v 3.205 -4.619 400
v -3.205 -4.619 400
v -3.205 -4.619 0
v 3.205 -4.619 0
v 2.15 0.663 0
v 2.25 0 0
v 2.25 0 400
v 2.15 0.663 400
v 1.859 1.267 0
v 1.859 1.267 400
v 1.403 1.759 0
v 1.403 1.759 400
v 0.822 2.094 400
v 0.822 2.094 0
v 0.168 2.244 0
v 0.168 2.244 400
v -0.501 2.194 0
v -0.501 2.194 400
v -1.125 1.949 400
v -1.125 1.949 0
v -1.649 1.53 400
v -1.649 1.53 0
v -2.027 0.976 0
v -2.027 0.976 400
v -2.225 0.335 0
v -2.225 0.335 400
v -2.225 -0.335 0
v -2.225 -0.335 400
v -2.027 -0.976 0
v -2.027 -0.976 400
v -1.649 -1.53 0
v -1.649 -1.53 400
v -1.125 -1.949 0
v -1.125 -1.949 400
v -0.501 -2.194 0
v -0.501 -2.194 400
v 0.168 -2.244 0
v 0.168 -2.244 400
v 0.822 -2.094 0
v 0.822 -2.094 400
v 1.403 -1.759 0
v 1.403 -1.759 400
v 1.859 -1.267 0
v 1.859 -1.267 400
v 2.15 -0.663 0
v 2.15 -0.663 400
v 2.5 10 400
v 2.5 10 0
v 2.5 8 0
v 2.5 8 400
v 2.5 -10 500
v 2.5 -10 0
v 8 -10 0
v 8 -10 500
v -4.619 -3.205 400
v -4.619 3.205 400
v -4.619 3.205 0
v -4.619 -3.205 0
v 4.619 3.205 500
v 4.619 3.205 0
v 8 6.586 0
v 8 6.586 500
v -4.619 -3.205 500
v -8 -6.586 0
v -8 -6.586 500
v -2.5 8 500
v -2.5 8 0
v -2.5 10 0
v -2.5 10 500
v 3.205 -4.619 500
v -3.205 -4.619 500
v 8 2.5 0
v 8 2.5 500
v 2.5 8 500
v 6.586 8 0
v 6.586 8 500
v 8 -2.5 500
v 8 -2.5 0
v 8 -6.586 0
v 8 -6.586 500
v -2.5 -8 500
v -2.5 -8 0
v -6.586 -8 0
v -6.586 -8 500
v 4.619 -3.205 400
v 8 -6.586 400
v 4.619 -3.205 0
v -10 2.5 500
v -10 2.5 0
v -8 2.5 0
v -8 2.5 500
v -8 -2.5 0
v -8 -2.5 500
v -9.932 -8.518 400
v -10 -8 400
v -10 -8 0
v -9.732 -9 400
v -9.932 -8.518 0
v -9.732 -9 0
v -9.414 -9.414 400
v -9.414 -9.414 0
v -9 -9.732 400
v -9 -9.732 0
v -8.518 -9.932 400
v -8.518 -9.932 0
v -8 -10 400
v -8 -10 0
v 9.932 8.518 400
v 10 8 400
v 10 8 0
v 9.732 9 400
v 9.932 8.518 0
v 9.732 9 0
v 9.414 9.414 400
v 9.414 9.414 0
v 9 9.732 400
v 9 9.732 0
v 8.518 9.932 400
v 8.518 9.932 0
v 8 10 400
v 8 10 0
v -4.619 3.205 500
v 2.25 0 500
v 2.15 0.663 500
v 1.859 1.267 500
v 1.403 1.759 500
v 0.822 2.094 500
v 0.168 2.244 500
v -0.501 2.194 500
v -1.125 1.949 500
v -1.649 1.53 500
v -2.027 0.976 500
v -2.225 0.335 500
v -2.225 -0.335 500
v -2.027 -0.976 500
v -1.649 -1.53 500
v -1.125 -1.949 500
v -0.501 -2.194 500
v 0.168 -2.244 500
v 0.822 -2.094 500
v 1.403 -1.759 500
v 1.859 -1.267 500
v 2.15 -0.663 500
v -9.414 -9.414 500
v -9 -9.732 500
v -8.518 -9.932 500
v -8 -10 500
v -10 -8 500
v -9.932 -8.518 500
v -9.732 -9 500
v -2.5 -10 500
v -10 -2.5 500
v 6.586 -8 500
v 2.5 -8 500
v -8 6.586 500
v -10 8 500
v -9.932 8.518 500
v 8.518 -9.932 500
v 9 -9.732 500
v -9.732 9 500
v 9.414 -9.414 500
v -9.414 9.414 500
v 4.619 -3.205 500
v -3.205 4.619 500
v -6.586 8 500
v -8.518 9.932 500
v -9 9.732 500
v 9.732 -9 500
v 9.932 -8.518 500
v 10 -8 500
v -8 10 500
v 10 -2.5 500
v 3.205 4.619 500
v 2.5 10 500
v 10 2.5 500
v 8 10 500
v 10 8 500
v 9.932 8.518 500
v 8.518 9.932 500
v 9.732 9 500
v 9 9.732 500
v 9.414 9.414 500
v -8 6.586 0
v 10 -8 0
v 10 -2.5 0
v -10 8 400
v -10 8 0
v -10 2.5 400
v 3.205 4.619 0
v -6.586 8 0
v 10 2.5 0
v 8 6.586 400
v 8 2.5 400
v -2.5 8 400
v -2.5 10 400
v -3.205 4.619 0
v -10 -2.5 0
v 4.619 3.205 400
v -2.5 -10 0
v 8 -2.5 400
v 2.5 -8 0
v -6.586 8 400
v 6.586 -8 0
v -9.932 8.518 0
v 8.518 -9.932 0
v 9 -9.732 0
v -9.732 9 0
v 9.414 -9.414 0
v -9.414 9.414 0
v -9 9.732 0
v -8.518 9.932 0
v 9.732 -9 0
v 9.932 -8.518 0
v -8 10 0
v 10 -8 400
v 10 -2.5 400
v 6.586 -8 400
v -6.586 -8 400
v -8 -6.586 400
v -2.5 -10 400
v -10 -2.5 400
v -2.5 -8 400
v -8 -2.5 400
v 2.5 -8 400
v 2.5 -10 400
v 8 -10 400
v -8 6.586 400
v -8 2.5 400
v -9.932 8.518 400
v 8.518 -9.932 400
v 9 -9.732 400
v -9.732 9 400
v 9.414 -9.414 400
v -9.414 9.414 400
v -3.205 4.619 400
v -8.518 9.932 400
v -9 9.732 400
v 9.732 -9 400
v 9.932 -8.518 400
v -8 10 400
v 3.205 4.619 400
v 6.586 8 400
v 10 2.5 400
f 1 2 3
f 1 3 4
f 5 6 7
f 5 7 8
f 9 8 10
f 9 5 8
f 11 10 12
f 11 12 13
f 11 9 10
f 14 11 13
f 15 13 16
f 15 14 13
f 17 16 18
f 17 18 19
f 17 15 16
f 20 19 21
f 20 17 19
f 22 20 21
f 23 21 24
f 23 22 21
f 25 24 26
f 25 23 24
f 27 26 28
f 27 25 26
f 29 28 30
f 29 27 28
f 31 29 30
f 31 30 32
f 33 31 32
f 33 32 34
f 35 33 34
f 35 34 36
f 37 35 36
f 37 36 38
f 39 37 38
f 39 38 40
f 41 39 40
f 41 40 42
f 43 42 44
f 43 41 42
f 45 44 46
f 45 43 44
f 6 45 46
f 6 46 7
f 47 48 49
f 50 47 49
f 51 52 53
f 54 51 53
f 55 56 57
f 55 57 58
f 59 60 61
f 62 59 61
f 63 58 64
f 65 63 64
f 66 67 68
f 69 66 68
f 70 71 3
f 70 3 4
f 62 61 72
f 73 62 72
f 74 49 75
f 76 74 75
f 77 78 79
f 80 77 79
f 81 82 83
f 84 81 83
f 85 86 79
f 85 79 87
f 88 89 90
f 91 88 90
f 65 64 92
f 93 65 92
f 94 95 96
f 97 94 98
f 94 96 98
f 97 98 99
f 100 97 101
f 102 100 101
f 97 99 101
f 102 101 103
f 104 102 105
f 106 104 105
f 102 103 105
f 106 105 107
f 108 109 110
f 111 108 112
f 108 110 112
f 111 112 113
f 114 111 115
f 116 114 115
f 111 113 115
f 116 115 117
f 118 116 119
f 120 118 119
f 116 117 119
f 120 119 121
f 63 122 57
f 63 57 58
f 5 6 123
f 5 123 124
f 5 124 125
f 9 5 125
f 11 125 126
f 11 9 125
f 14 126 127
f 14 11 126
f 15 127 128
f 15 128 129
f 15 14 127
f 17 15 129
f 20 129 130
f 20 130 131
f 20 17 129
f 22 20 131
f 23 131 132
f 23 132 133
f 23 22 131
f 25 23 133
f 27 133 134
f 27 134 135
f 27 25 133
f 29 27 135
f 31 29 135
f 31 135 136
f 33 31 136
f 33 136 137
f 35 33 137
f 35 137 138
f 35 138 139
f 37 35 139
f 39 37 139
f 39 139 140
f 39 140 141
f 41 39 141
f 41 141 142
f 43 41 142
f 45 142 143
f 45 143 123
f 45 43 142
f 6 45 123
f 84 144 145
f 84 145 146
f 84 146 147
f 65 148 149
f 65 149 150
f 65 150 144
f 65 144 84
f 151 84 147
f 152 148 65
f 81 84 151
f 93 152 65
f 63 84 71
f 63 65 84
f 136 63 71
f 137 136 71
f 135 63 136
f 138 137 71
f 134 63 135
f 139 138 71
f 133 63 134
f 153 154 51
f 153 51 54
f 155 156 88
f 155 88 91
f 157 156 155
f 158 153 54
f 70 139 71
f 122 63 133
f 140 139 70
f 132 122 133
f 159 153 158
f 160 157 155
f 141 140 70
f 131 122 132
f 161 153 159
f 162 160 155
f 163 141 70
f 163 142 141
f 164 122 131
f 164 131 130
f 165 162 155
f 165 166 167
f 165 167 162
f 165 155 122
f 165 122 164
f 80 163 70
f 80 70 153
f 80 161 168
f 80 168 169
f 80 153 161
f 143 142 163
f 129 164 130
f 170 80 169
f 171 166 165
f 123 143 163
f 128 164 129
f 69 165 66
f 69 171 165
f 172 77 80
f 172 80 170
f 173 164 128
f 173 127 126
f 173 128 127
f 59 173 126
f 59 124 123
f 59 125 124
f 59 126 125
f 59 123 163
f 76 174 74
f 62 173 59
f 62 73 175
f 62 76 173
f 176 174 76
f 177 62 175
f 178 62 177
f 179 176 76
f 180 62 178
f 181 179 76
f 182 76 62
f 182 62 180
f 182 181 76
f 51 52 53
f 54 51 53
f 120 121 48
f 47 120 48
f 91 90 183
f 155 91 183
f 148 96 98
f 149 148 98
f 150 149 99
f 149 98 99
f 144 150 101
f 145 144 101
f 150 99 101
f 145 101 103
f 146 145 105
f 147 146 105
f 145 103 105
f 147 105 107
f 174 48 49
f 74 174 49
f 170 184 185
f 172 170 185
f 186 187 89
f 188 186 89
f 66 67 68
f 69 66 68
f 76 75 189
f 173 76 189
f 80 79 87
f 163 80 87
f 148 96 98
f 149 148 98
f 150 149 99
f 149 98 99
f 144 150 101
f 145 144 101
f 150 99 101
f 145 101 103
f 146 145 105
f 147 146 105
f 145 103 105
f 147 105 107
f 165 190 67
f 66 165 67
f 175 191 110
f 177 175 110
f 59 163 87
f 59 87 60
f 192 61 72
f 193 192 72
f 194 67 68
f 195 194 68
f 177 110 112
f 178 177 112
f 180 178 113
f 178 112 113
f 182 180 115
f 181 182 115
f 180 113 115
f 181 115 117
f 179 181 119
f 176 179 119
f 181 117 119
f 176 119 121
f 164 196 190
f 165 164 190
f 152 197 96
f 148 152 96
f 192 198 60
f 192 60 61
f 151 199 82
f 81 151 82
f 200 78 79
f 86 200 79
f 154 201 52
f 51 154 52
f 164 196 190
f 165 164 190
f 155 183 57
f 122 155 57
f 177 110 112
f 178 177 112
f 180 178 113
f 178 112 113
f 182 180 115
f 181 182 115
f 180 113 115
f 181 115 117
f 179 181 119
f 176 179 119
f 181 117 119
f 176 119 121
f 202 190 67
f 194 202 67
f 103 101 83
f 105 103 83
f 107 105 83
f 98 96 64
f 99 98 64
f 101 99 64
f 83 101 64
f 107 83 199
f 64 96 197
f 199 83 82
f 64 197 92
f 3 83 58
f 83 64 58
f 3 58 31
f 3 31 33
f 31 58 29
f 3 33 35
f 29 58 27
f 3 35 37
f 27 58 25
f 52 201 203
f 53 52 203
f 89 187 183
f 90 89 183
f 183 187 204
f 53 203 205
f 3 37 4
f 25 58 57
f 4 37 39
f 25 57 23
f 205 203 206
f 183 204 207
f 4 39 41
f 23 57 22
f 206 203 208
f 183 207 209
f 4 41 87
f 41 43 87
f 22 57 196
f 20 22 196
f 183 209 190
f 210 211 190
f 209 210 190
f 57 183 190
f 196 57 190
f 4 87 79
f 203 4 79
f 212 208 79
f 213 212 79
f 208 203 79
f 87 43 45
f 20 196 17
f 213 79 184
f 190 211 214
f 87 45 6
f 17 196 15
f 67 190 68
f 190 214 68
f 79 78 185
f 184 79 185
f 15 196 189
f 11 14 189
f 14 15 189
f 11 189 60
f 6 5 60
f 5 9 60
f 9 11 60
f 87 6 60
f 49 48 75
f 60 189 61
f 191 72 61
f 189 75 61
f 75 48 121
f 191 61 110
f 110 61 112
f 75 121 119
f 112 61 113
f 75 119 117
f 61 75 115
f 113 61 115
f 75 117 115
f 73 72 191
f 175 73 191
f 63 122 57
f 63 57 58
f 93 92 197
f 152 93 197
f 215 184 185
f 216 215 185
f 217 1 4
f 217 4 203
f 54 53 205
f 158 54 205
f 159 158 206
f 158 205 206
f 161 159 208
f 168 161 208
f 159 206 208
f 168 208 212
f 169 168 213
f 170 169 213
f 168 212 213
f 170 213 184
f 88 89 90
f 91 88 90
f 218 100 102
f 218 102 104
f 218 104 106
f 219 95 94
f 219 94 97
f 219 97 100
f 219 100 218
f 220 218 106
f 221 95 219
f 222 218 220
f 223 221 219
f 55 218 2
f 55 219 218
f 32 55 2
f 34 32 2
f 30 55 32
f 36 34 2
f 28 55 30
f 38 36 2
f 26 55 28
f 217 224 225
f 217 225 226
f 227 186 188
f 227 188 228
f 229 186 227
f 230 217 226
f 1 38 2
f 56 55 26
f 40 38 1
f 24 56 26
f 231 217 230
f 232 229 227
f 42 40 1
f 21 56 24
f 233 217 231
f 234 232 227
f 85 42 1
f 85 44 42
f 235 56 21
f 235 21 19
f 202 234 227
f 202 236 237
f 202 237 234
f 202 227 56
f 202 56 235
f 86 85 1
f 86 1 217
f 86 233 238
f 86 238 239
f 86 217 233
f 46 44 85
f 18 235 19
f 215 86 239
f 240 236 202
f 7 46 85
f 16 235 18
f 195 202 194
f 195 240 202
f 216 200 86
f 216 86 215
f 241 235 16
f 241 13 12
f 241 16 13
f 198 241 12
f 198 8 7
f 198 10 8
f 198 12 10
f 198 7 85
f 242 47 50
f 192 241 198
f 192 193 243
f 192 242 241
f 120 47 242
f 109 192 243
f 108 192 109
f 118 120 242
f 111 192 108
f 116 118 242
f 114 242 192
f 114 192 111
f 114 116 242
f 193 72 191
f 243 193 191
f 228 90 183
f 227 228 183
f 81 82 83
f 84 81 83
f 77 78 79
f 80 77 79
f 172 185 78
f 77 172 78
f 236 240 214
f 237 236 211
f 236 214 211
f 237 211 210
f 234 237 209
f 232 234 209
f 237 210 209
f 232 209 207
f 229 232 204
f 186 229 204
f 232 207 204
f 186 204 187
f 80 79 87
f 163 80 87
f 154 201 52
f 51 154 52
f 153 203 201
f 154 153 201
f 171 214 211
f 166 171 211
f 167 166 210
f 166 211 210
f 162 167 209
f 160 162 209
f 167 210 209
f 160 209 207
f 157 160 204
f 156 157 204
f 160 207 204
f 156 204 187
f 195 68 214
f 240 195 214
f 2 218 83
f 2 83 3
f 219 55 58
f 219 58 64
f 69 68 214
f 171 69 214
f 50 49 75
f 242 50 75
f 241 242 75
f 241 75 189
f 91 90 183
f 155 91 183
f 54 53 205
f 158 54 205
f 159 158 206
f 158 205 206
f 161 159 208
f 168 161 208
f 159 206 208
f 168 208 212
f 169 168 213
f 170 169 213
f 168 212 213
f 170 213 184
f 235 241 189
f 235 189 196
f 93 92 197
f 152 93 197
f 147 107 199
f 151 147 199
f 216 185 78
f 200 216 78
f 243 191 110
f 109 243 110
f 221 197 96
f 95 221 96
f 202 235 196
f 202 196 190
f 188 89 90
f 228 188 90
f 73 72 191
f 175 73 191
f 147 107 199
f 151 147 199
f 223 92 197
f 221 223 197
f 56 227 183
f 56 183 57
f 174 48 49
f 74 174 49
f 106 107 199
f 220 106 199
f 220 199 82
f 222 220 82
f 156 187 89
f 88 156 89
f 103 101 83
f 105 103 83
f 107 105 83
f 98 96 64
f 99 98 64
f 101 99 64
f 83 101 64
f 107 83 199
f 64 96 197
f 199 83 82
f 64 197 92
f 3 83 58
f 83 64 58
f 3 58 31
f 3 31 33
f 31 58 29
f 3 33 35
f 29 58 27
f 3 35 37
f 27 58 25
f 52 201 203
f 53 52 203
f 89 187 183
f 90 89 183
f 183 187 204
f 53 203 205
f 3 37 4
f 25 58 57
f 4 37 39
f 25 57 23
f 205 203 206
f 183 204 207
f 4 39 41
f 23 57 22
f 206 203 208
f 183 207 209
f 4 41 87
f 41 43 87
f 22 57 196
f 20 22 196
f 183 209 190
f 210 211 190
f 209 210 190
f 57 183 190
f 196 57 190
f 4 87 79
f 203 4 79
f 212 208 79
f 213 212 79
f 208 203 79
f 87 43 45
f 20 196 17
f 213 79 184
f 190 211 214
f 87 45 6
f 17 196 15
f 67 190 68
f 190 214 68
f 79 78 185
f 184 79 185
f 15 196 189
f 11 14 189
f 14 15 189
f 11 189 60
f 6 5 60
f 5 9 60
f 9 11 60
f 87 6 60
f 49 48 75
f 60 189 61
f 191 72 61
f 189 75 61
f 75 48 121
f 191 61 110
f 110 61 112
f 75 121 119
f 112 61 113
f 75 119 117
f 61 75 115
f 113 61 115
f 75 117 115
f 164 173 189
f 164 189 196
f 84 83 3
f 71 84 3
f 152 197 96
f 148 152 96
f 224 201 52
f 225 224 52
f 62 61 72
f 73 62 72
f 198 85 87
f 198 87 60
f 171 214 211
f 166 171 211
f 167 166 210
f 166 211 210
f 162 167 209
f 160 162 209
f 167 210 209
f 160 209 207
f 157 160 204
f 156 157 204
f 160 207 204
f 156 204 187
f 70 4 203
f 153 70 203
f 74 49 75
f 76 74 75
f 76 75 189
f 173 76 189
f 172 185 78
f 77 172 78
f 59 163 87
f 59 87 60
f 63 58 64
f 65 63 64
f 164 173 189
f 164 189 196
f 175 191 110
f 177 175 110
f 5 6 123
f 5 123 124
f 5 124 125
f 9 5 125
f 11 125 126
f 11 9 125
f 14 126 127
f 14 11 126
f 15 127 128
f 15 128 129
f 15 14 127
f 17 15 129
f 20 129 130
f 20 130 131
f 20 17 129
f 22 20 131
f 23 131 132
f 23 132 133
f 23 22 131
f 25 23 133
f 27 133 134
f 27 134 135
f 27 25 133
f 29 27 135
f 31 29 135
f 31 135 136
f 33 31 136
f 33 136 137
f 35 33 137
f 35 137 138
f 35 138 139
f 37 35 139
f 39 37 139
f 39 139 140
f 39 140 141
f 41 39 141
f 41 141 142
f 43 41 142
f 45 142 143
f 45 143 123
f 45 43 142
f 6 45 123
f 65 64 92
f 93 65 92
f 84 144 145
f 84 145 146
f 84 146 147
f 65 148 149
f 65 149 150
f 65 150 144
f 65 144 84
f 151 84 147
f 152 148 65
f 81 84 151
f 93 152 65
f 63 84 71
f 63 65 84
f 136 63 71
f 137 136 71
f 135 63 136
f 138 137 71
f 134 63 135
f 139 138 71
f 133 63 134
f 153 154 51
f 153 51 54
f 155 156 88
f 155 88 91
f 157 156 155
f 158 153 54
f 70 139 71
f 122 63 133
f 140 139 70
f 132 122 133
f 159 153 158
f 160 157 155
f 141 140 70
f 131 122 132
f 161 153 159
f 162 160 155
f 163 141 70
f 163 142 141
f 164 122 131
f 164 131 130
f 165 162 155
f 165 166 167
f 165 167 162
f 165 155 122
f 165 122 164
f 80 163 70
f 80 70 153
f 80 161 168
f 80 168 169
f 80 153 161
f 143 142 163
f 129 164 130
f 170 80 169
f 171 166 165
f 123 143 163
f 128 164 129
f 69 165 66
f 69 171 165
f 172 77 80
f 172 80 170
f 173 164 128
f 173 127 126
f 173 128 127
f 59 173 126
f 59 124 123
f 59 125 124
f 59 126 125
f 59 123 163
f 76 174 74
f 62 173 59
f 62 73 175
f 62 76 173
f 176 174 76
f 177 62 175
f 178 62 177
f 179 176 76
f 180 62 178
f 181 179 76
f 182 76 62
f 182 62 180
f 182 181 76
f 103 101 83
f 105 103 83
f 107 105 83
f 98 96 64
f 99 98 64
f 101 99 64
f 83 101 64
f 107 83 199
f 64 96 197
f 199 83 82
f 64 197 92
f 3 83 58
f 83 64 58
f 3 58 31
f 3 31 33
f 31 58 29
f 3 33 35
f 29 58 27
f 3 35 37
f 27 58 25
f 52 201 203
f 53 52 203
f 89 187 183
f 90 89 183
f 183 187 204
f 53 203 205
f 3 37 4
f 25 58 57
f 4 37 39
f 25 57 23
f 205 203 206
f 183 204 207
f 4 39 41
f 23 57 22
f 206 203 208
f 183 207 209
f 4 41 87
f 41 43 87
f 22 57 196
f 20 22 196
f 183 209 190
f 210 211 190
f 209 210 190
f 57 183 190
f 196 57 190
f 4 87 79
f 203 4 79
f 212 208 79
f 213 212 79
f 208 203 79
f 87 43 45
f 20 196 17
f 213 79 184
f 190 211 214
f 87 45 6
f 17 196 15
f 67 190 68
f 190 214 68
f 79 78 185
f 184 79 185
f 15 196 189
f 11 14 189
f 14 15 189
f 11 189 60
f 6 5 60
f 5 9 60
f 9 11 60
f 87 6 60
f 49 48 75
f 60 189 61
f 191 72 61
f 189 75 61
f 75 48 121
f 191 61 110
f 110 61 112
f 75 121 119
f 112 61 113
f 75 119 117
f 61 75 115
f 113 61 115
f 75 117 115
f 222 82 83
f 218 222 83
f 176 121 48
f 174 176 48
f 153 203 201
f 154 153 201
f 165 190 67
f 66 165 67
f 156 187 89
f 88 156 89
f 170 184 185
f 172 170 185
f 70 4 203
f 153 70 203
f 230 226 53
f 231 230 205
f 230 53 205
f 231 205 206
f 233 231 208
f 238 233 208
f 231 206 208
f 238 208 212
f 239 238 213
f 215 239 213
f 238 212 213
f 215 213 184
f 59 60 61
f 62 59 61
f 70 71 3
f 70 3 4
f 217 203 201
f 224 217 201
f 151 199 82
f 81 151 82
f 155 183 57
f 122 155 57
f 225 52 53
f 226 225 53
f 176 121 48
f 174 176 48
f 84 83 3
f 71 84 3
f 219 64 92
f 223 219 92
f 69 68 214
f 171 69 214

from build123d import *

# Parameters (mm, degrees)
F0_R     = 2.25
F1_DEPTH = 500
F2_DEPTH = 500
F3_DEPTH = 400


with BuildPart() as f1:
    # F0 (on Top) → F1 (new body)
    with BuildSketch(Plane.XY):
        with BuildLine():
            ThreePointArc((-10, -8), (-9.414214, -9.414214), (-8, -10))
            Line((-8, -10), (-2.5, -10))
            Line((-2.5, -10), (-2.5, -8))
            Line((-2.5, -8), (-6.585786, -8))
            Line((-6.585786, -8), (-3.204844, -4.619057))
            Line((-3.204844, -4.619057), (0, -4.619057))
            Line((0, -4.619057), (3.204844, -4.619057))
            Line((3.204844, -4.619057), (6.585786, -8))
            Line((6.585786, -8), (2.5, -8))
            Line((2.5, -8), (2.5, -10))
            Line((2.5, -10), (8, -10))
            ThreePointArc((8, -10), (9.414214, -9.414214), (10, -8))
            Line((10, -8), (10, -2.5))
            Line((10, -2.5), (8, -2.5))
            Line((8, -2.5), (8, -6.585786))
            Line((8, -6.585786), (4.619057, -3.204844))
            Line((4.619057, -3.204844), (4.619057, 0))
            Line((4.619057, 0), (4.619057, 3.204844))
            Line((4.619057, 3.204844), (8, 6.585786))
            Line((8, 6.585786), (8, 2.5))
            Line((8, 2.5), (10, 2.5))
            Line((10, 2.5), (10, 8))
            ThreePointArc((10, 8), (9.414214, 9.414214), (8, 10))
            Line((8, 10), (2.5, 10))
            Line((2.5, 10), (2.5, 8))
            Line((2.5, 8), (6.585786, 8))
            Line((6.585786, 8), (3.204844, 4.619057))
            Line((3.204844, 4.619057), (0, 4.619057))
            Line((0, 4.619057), (-3.204844, 4.619057))
            Line((-3.204844, 4.619057), (-6.585786, 8))
            Line((-6.585786, 8), (-2.5, 8))
            Line((-2.5, 8), (-2.5, 10))
            Line((-2.5, 10), (-8, 10))
            ThreePointArc((-8, 10), (-9.414214, 9.414214), (-10, 8))
            Line((-10, 8), (-10, 2.5))
            Line((-10, 2.5), (-8, 2.5))
            Line((-8, 2.5), (-8, 6.585786))
            Line((-8, 6.585786), (-4.619057, 3.204844))
            Line((-4.619057, 3.204844), (-4.619057, 0))
            Line((-4.619057, 0), (-4.619057, -3.204844))
            Line((-4.619057, -3.204844), (-8, -6.585786))
            Line((-8, -6.585786), (-8, -2.5))
            Line((-8, -2.5), (-10, -2.5))
            Line((-10, -2.5), (-10, -8))
        make_face()
        Circle(F0_R, mode=Mode.SUBTRACT)
    extrude(amount=F1_DEPTH)


with BuildPart() as f2:
    # F0 (on Top) → F2 (new body)
    with BuildSketch(Plane.XY):
        with BuildLine():
            ThreePointArc((-10, -8), (-9.414214, -9.414214), (-8, -10))
            Line((-8, -10), (-2.5, -10))
            Line((-2.5, -10), (-2.5, -8))
            Line((-2.5, -8), (-6.585786, -8))
            Line((-6.585786, -8), (-3.204844, -4.619057))
            Line((-3.204844, -4.619057), (0, -4.619057))
            Line((0, -4.619057), (3.204844, -4.619057))
            Line((3.204844, -4.619057), (6.585786, -8))
            Line((6.585786, -8), (2.5, -8))
            Line((2.5, -8), (2.5, -10))
            Line((2.5, -10), (8, -10))
            ThreePointArc((8, -10), (9.414214, -9.414214), (10, -8))
            Line((10, -8), (10, -2.5))
            Line((10, -2.5), (8, -2.5))
            Line((8, -2.5), (8, -6.585786))
            Line((8, -6.585786), (4.619057, -3.204844))
            Line((4.619057, -3.204844), (4.619057, 0))
            Line((4.619057, 0), (4.619057, 3.204844))
            Line((4.619057, 3.204844), (8, 6.585786))
            Line((8, 6.585786), (8, 2.5))
            Line((8, 2.5), (10, 2.5))
            Line((10, 2.5), (10, 8))
            ThreePointArc((10, 8), (9.414214, 9.414214), (8, 10))
            Line((8, 10), (2.5, 10))
            Line((2.5, 10), (2.5, 8))
            Line((2.5, 8), (6.585786, 8))
            Line((6.585786, 8), (3.204844, 4.619057))
            Line((3.204844, 4.619057), (0, 4.619057))
            Line((0, 4.619057), (-3.204844, 4.619057))
            Line((-3.204844, 4.619057), (-6.585786, 8))
            Line((-6.585786, 8), (-2.5, 8))
            Line((-2.5, 8), (-2.5, 10))
            Line((-2.5, 10), (-8, 10))
            ThreePointArc((-8, 10), (-9.414214, 9.414214), (-10, 8))
            Line((-10, 8), (-10, 2.5))
            Line((-10, 2.5), (-8, 2.5))
            Line((-8, 2.5), (-8, 6.585786))
            Line((-8, 6.585786), (-4.619057, 3.204844))
            Line((-4.619057, 3.204844), (-4.619057, 0))
            Line((-4.619057, 0), (-4.619057, -3.204844))
            Line((-4.619057, -3.204844), (-8, -6.585786))
            Line((-8, -6.585786), (-8, -2.5))
            Line((-8, -2.5), (-10, -2.5))
            Line((-10, -2.5), (-10, -8))
        make_face()
        Circle(F0_R, mode=Mode.SUBTRACT)
    extrude(amount=F2_DEPTH)


with BuildPart() as f3:
    # F0 (on Top) → F3 (new body)
    with BuildSketch(Plane.XY):
        with BuildLine():
            ThreePointArc((-10, -8), (-9.414214, -9.414214), (-8, -10))
            Line((-8, -10), (-2.5, -10))
            Line((-2.5, -10), (-2.5, -8))
            Line((-2.5, -8), (-6.585786, -8))
            Line((-6.585786, -8), (-3.204844, -4.619057))
            Line((-3.204844, -4.619057), (0, -4.619057))
            Line((0, -4.619057), (3.204844, -4.619057))
            Line((3.204844, -4.619057), (6.585786, -8))
            Line((6.585786, -8), (2.5, -8))
            Line((2.5, -8), (2.5, -10))
            Line((2.5, -10), (8, -10))
            ThreePointArc((8, -10), (9.414214, -9.414214), (10, -8))
            Line((10, -8), (10, -2.5))
            Line((10, -2.5), (8, -2.5))
            Line((8, -2.5), (8, -6.585786))
            Line((8, -6.585786), (4.619057, -3.204844))
            Line((4.619057, -3.204844), (4.619057, 0))
            Line((4.619057, 0), (4.619057, 3.204844))
            Line((4.619057, 3.204844), (8, 6.585786))
            Line((8, 6.585786), (8, 2.5))
            Line((8, 2.5), (10, 2.5))
            Line((10, 2.5), (10, 8))
            ThreePointArc((10, 8), (9.414214, 9.414214), (8, 10))
            Line((8, 10), (2.5, 10))
            Line((2.5, 10), (2.5, 8))
            Line((2.5, 8), (6.585786, 8))
            Line((6.585786, 8), (3.204844, 4.619057))
            Line((3.204844, 4.619057), (0, 4.619057))
            Line((0, 4.619057), (-3.204844, 4.619057))
            Line((-3.204844, 4.619057), (-6.585786, 8))
            Line((-6.585786, 8), (-2.5, 8))
            Line((-2.5, 8), (-2.5, 10))
            Line((-2.5, 10), (-8, 10))
            ThreePointArc((-8, 10), (-9.414214, 9.414214), (-10, 8))
            Line((-10, 8), (-10, 2.5))
            Line((-10, 2.5), (-8, 2.5))
            Line((-8, 2.5), (-8, 6.585786))
            Line((-8, 6.585786), (-4.619057, 3.204844))
            Line((-4.619057, 3.204844), (-4.619057, 0))
            Line((-4.619057, 0), (-4.619057, -3.204844))
            Line((-4.619057, -3.204844), (-8, -6.585786))
            Line((-8, -6.585786), (-8, -2.5))
            Line((-8, -2.5), (-10, -2.5))
            Line((-10, -2.5), (-10, -8))
        make_face()
        Circle(F0_R, mode=Mode.SUBTRACT)
    extrude(amount=F3_DEPTH)


solid = Compound([f1.part, f2.part, f3.part])
